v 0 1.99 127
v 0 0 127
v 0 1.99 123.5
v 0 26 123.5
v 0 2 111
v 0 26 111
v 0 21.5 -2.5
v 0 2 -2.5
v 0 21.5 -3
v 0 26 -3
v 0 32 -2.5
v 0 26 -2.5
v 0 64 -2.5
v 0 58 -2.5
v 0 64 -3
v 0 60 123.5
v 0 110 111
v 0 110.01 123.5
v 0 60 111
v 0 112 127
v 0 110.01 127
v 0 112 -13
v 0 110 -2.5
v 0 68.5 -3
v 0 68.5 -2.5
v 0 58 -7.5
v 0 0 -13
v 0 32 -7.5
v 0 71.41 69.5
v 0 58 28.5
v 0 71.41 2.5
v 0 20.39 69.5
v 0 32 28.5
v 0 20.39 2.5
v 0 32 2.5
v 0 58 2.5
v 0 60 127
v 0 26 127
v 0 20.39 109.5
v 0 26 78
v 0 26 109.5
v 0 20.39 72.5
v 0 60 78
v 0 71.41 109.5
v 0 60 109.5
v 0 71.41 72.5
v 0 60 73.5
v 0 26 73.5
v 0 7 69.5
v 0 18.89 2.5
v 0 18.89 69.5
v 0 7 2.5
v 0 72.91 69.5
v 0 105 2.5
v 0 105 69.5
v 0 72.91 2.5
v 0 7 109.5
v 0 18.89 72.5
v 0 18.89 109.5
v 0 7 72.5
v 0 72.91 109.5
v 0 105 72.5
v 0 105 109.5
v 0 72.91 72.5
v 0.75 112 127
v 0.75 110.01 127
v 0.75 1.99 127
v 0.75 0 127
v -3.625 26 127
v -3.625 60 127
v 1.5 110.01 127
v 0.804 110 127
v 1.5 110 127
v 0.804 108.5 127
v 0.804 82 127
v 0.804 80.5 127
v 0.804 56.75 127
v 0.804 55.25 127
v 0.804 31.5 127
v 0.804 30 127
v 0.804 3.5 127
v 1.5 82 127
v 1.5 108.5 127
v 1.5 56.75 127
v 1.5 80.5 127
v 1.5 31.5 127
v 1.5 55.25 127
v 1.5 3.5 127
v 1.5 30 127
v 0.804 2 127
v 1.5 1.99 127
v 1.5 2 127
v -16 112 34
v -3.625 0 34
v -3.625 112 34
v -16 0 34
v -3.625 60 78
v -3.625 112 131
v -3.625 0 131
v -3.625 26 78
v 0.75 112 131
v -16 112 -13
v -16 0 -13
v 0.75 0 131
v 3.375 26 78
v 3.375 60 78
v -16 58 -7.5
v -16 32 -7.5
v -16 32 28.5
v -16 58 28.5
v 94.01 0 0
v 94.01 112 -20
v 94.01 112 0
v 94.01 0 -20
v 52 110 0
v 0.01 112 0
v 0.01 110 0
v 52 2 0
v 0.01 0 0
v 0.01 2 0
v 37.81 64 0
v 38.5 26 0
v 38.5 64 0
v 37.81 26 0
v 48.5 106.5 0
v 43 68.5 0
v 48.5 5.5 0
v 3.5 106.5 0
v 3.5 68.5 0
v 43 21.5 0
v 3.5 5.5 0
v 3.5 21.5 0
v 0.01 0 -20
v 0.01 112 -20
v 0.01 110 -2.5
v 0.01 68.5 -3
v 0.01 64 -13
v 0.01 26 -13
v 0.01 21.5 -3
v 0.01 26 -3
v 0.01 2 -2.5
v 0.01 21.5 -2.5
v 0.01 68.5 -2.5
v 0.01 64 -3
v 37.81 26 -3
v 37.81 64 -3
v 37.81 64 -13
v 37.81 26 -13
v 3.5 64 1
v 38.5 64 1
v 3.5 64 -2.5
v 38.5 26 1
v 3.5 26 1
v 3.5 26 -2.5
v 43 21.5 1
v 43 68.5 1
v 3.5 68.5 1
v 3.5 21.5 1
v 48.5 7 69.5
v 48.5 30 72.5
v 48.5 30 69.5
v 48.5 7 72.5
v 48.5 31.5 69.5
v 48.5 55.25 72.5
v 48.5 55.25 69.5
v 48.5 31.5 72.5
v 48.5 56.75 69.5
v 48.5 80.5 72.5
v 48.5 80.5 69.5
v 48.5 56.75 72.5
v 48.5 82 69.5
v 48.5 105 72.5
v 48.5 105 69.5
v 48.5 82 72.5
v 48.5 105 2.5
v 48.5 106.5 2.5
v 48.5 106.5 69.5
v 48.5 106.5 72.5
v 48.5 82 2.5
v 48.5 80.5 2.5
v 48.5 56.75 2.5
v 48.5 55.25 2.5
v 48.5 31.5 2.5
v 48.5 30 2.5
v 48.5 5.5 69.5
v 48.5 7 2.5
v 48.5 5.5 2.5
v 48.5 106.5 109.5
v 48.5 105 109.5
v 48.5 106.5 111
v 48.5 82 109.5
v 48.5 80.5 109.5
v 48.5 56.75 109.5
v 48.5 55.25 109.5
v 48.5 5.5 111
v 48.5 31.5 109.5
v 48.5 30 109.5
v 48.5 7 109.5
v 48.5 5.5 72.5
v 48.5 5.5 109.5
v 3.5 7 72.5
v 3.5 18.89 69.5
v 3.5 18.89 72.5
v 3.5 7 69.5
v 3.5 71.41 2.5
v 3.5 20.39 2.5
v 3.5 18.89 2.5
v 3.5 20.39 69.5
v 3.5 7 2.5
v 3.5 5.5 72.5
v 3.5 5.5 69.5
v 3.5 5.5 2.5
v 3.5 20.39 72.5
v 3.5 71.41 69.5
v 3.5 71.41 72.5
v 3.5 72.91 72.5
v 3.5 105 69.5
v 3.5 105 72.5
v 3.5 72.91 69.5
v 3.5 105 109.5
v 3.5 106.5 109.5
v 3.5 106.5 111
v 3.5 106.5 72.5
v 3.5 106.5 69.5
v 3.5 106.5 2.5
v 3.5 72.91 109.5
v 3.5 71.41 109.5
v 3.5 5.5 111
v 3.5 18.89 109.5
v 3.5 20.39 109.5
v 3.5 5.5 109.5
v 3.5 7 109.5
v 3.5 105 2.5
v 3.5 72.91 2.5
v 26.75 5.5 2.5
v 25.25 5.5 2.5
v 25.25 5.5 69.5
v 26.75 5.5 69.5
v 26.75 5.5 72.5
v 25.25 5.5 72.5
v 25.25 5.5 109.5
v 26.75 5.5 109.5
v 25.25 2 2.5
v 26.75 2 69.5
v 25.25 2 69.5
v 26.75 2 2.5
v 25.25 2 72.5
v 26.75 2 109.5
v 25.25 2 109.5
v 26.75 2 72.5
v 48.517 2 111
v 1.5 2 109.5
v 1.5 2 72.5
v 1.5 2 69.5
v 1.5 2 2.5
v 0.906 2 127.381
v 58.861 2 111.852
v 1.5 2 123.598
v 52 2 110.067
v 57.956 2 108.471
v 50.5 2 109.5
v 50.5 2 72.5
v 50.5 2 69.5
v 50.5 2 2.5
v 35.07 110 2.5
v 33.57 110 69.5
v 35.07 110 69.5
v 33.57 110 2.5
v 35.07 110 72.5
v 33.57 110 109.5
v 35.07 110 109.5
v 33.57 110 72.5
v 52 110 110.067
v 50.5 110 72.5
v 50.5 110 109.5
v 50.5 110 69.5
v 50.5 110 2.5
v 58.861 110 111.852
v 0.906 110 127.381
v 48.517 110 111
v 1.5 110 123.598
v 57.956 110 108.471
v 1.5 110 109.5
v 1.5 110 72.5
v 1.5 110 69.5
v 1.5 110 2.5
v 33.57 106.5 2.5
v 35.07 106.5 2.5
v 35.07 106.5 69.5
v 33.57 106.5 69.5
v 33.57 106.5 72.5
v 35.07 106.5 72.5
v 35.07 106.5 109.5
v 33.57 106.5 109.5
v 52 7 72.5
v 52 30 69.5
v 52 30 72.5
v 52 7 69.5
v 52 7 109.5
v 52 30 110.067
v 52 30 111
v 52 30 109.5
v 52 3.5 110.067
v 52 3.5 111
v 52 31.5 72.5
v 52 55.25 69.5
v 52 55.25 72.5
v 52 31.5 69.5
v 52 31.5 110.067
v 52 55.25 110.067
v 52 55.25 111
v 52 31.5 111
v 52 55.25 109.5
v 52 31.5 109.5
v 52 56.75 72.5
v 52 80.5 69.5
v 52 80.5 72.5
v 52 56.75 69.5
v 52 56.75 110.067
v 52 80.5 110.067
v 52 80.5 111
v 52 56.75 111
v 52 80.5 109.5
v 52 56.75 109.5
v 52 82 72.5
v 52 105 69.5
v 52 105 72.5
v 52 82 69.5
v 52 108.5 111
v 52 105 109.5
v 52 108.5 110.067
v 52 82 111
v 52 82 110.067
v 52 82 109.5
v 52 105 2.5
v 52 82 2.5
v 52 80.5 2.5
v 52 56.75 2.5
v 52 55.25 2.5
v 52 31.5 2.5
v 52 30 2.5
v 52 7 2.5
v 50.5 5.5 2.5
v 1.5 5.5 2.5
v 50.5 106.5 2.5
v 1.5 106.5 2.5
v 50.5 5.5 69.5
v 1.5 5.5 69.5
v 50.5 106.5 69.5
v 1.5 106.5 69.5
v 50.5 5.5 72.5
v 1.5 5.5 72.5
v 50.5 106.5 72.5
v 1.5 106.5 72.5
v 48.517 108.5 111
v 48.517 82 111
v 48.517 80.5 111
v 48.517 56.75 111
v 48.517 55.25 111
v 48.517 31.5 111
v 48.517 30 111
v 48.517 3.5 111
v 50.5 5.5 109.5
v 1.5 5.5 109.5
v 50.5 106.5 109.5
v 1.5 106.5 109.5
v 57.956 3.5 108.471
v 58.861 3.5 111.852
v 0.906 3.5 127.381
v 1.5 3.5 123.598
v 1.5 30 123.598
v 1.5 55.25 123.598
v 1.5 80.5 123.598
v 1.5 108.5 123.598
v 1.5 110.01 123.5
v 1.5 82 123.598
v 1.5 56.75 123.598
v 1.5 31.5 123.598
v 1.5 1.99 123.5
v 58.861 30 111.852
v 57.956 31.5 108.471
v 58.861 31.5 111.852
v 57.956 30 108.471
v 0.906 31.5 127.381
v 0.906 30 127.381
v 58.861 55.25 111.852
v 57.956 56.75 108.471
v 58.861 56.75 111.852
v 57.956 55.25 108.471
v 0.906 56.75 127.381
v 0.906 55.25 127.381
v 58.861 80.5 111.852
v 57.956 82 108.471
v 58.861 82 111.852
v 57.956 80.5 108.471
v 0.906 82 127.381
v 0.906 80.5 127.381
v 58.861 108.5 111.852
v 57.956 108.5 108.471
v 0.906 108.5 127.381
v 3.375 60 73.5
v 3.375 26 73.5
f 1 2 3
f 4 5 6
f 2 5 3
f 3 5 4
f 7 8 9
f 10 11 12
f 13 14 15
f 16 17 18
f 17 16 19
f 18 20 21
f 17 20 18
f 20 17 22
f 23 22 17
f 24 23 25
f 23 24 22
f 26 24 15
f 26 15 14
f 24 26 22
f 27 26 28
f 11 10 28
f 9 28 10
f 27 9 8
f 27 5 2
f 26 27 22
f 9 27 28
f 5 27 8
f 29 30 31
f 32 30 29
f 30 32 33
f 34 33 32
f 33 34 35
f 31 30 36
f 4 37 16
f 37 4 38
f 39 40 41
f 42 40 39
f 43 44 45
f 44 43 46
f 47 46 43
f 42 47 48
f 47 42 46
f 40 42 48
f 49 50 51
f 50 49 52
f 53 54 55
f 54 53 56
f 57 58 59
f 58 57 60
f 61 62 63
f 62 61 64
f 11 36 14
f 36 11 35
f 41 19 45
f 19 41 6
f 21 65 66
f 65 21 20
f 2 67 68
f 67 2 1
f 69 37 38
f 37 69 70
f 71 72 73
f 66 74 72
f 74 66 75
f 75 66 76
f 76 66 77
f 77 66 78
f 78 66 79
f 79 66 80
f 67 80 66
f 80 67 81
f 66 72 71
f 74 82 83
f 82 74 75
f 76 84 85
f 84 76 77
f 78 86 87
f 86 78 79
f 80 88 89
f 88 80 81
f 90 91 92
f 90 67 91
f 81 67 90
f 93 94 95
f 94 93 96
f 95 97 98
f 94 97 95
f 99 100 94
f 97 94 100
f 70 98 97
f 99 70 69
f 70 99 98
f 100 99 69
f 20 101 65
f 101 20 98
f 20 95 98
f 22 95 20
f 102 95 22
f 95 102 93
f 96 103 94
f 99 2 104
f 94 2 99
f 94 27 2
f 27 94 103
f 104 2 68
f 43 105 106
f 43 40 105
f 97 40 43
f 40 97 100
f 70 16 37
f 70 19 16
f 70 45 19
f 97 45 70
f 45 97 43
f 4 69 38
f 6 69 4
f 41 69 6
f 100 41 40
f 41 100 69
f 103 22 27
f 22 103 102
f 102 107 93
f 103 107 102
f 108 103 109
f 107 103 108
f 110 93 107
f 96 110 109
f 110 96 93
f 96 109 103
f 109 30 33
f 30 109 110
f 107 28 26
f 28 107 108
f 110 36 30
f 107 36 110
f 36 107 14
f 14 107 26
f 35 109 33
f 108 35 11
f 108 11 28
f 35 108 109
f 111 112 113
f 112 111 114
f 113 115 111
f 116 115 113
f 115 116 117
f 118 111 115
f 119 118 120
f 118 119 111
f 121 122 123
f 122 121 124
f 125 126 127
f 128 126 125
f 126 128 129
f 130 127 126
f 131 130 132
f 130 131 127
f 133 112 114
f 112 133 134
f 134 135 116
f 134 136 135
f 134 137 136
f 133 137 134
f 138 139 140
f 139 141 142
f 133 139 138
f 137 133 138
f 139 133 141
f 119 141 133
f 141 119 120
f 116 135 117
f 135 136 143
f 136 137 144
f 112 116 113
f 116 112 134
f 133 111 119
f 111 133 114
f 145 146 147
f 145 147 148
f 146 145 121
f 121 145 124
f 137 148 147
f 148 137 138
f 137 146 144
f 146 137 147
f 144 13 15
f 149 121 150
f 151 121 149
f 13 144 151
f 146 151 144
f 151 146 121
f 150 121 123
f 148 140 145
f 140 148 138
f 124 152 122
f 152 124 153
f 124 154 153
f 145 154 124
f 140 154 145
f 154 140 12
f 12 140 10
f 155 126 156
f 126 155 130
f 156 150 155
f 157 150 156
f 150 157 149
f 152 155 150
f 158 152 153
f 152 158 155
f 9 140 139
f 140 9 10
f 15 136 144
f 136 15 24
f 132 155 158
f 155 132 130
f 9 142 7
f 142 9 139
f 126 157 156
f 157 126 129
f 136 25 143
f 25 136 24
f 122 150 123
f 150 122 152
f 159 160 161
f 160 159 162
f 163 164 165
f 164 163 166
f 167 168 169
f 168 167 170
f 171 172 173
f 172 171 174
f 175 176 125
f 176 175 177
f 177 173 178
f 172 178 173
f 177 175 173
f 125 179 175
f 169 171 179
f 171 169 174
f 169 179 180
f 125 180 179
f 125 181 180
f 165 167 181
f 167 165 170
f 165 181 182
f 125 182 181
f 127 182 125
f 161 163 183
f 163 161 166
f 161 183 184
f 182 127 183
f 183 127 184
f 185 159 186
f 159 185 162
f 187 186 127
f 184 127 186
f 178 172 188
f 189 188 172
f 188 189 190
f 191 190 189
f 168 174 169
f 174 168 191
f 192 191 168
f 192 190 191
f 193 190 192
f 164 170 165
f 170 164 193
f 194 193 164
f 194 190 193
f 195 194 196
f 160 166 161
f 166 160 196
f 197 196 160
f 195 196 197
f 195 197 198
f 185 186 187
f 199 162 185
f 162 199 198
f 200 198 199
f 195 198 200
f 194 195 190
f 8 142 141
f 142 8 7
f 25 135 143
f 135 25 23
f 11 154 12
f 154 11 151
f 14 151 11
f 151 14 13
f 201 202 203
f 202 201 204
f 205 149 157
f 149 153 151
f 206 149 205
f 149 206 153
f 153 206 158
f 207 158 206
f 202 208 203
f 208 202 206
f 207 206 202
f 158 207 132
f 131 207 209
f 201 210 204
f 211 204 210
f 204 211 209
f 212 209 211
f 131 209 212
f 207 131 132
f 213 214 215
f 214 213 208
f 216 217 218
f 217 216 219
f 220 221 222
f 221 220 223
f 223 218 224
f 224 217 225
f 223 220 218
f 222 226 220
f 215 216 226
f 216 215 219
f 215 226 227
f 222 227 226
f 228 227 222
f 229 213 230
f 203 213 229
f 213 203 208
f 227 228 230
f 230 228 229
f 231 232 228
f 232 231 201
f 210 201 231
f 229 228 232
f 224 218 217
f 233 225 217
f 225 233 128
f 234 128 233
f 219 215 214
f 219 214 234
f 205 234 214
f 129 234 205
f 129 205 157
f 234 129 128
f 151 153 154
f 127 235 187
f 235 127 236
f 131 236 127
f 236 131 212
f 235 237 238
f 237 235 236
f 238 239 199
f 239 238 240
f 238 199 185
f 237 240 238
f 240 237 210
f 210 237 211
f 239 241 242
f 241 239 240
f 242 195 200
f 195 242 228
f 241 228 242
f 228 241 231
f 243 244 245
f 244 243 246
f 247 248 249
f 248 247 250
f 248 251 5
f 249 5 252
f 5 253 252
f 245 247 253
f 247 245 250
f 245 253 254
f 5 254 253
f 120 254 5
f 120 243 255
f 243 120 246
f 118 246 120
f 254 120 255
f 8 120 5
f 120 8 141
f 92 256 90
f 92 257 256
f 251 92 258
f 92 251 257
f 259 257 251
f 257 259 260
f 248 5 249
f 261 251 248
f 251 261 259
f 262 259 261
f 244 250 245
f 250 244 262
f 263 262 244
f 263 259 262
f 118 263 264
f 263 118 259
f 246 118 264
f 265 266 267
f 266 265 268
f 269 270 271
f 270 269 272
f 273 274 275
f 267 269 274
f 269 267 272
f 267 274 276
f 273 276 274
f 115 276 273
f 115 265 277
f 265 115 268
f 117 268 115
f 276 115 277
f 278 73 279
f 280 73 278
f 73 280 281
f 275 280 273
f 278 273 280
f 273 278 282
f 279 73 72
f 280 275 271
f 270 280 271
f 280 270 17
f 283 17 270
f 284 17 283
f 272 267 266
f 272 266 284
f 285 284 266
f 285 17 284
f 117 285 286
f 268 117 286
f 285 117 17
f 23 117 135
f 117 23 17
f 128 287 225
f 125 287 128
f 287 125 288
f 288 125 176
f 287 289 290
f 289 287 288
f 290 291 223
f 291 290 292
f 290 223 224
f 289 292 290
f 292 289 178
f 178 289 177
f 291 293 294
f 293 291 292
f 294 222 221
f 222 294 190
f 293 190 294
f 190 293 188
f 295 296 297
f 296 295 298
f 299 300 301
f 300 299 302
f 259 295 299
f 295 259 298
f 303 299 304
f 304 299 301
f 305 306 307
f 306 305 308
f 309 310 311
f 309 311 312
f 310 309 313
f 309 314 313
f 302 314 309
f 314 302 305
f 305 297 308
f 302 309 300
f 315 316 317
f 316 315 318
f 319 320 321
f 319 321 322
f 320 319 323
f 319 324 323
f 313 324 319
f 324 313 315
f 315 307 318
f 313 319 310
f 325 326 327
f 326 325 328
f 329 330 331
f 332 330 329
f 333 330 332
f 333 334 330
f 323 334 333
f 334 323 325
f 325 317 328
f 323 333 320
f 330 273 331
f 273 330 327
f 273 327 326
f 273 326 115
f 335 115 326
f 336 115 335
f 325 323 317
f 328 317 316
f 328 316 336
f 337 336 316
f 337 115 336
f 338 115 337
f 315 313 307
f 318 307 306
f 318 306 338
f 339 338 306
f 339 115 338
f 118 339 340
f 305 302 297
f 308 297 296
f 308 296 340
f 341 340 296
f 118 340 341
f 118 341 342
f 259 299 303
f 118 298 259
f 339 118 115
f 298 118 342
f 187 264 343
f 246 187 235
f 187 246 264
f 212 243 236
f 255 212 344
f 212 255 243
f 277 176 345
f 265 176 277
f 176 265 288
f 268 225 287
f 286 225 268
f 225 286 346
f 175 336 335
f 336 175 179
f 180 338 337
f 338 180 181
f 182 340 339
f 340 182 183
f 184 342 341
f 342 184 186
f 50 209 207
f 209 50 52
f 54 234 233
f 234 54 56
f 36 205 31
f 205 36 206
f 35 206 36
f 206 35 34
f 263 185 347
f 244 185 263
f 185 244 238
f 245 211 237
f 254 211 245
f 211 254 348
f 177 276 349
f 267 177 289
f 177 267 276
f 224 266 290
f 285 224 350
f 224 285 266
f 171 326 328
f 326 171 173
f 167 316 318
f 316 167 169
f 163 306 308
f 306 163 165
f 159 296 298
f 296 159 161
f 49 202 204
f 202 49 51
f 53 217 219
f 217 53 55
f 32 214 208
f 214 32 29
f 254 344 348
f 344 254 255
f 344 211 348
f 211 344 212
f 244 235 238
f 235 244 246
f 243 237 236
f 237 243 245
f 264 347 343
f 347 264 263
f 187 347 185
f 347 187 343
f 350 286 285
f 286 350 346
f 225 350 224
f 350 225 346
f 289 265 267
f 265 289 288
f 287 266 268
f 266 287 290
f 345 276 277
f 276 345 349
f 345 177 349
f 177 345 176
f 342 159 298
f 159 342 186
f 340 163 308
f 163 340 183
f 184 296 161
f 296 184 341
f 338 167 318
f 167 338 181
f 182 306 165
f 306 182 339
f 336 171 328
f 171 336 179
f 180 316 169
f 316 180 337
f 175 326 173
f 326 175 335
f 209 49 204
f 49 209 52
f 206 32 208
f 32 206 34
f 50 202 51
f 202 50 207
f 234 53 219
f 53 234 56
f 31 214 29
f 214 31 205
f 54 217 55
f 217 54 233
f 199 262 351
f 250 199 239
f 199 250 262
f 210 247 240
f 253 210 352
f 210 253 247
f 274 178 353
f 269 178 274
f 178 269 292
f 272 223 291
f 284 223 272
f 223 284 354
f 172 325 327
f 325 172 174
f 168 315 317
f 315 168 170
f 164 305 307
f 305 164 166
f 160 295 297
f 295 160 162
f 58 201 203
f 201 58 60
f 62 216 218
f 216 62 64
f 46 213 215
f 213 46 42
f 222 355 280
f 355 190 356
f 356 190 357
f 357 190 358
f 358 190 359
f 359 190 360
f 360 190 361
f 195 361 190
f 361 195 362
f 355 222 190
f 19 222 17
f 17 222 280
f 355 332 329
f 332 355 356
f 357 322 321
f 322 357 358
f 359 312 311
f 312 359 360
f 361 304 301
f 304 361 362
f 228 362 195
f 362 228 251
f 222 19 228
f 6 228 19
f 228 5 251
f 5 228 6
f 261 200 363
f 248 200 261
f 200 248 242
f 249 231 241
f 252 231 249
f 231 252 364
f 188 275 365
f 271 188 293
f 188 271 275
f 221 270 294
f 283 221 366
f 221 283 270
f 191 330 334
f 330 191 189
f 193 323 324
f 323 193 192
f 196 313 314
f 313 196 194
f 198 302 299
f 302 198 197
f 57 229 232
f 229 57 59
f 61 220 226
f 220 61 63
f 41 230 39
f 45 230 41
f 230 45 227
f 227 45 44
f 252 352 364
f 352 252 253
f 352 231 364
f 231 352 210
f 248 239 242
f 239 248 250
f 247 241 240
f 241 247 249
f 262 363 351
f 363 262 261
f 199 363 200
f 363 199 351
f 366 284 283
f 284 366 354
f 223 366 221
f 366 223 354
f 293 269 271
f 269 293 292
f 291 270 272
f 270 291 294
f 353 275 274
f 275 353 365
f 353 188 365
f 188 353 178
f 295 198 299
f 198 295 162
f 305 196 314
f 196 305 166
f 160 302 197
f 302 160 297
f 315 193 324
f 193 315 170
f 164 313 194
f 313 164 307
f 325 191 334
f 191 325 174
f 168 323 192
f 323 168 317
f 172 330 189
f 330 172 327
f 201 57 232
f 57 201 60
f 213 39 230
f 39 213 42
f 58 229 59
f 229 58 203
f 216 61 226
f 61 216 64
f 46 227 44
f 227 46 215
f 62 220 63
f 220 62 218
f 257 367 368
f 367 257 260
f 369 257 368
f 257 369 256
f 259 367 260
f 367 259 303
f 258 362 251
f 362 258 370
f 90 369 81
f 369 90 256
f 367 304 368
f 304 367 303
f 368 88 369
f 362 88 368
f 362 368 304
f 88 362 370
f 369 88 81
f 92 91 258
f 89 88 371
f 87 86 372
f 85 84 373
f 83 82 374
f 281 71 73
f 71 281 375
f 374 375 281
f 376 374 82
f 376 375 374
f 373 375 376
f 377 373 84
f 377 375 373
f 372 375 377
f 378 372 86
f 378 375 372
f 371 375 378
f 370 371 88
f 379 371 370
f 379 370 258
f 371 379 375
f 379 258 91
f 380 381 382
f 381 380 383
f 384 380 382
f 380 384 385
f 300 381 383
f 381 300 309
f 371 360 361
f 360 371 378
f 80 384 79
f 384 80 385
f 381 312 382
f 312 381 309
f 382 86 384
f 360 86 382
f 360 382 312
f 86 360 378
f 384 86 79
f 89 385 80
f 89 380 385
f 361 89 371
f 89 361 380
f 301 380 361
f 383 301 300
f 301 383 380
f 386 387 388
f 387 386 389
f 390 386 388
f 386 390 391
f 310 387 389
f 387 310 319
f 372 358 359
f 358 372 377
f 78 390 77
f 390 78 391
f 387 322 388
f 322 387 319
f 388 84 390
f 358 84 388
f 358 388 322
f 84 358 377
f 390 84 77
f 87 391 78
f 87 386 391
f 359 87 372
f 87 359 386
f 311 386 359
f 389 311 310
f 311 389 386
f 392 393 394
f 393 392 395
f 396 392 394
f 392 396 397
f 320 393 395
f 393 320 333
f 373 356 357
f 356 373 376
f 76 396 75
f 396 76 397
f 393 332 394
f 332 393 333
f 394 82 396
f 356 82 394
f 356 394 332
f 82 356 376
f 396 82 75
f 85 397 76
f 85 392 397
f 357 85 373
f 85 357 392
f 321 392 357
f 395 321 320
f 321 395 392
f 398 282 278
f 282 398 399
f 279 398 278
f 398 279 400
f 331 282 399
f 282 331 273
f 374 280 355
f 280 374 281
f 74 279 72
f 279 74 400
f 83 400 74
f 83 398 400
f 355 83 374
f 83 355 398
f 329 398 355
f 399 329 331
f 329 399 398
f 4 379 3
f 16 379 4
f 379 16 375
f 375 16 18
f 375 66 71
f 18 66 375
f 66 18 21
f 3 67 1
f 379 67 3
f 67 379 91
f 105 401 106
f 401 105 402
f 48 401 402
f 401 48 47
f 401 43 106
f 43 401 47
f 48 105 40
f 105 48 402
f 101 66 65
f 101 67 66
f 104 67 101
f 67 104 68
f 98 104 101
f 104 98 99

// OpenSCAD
// file: house.scad
/*
 * Partial North Wall
 * 1 = 1 inch
 */
 
// brick wall
brickdepth = 3.625;
difference() {
    color("red")
        translate([-brickdepth, 0, 34])
            cube([brickdepth, 112, 93]);

    translate([-brickdepth - 0.1, 26, 78])
        cube([brickdepth + 0.2, 34, 49.5]);
}

// Window base
color("red")
    translate([-brickdepth, 26, 73.5])
        cube([7, 34, 4.5]);


// trim
color("white")
    translate([-brickdepth, 0, 127])
        cube([brickdepth + 0.75, 112, 4]);

// foundation
concretedepth = 16;
difference() {
    color("lightgrey")
        translate([-concretedepth, 0, -13])
            cube([concretedepth, 112, 47]);

    translate([-concretedepth - 0.1, 32, -7.5])
        cube([concretedepth + 0.2, 26, 36]);
}

// earth
translate([0.01,0,0])
difference() {
    color([0.62, 0.32, 0.18, 0.50])
        translate([0, 0, -20])
            cube([94, 112, 20]);

    translate([-0.2, 26, -13])
        cube([38, 38, 13 + 0.1]);
}

// Window well brick
color("darkgrey") {
    for (y = [21.5, 64])
        translate([0, y, -3])
            cube([43, 4.5, 4]);

    translate([38.5, 21.5, -3])
        cube([4.5, 47, 4]);
}
// file: beam.scad
/*
 * beam.scad
 * 1 = 1 inch
 * Variables: defaultBeamHeight (=1.5), defaultBeamWidth (=3.5), beamColor (="wheat")
 */

defaultBeamHeight = 1.5;
defaultBeamWidth = 3.5;
beamColor = "wheat";

module xBeamY(length, translation=[0, 0, 0], rotation=[0, 0, 0], beamHeight=defaultBeamHeight, beamWidth=defaultBeamWidth) {
    color(beamColor)
        translate(translation)
        rotate(rotation)
        cube([length, beamWidth, beamHeight]);
}

module xBeamZ(length, translation=[0, 0, 0], rotation=[0, 0, 0], beamHeight=defaultBeamHeight, beamWidth=defaultBeamWidth) {
    color(beamColor)
        translate(translation)
        rotate(rotation)
        cube([length, beamHeight, beamWidth]);
}

module yBeamX(length, translation=[0, 0, 0], rotation=[0, 0, 0], beamHeight=defaultBeamHeight, beamWidth=defaultBeamWidth) {
    color(beamColor)
        translate(translation)
        rotate(rotation)
        cube([beamWidth, length, beamHeight]);
}

module yBeamZ(length, translation=[0, 0, 0], rotation=[0, 0, 0], beamHeight=defaultBeamHeight, beamWidth=defaultBeamWidth) {
    color(beamColor)
        translate(translation)
        rotate(rotation)
        cube([beamHeight, length, beamWidth]);
}

module zBeamX(length, translation=[0, 0, 0], rotation=[0, 0, 0], beamHeight=defaultBeamHeight, beamWidth=defaultBeamWidth) {
    color(beamColor)
        translate(translation)
        rotate(rotation)
        cube([beamWidth, beamHeight, length]);
}

module zBeamY(length, translation=[0, 0, 0], rotation=[0, 0, 0], beamHeight=defaultBeamHeight, beamWidth=defaultBeamWidth) {
    color(beamColor)
        translate(translation)
        rotate(rotation)
        cube([beamHeight, beamWidth, length]);
}
// main file
include <beam.scad>
include <house.scad>

// for beam.scad
defaultBeamHeight = 1.5;
defaultBeamWidth = 3.5;

beamHeight = defaultBeamHeight;
beamWidth = defaultBeamWidth;

totalX = 52;
totalY = 108;
totalZ = 127;

foundationDepth = 2.5;
firstTierZ = 70;
secondTierZ = 40;

offsety = 2;

function ratioPlacement(ratio, totalWidth, placementWidth) = max(0, min(totalWidth - placementWidth, totalWidth * ratio - placementWidth / 2));

function evenStuds(studCount, totalWidth) = [ for (x = [0 : 1 / (studCount + 1) : 1]) ratioPlacement(x, totalWidth, beamHeight) ];

longWallWidth = totalY - beamWidth * 2;

farWallStuds = evenStuds(3, longWallWidth);

closeWallStuds = [
    ratioPlacement(0, longWallWidth, beamHeight),
    ratioPlacement(0.14, longWallWidth, beamHeight),
    ratioPlacement(0.66, longWallWidth, beamHeight),
    ratioPlacement(1, longWallWidth, beamHeight)
];

leftWallStuds = evenStuds(1, totalX);

rightWallStuds = [
    ratioPlacement(0, totalX, beamHeight),
    ratioPlacement(0.66, totalX, beamHeight),
    ratioPlacement(1, totalX, beamHeight)
];

rafters = [
    ratioPlacement(0, totalY, beamHeight),
    farWallStuds[1] + beamWidth,
    farWallStuds[2] + beamWidth,
    farWallStuds[3] + beamWidth,
    ratioPlacement(1, totalY, beamHeight)
];
rafterLength = 60;

module tier(height) {

        // Floor and top plates
        for (z = [0, height - beamHeight]) {
            // Side walls
            for (y = [0, totalY - beamWidth])
                xBeamY(totalX, [0, y, z]);

            // Long walls
            for (x = [0, totalX - beamWidth])
                yBeamX(totalY - 2 * beamWidth, [x, beamWidth, z]);
        }

        studLength = height - 2 * beamHeight;

        for (x = leftWallStuds)
            zBeamY(studLength, [x, 0, beamHeight]);

        for (x = rightWallStuds)
            zBeamY(studLength, [x, totalY - beamWidth, beamHeight]);

        for (y = farWallStuds)
            zBeamX(studLength, [totalX - beamWidth, y + beamWidth, beamHeight]);

        for (y = closeWallStuds)
            zBeamX(studLength, [0, y + beamWidth, beamHeight]);

}

module roofBeam() {
    yBeamZ(totalY + 0.02, [0, -0.01, totalZ - beamWidth]);
}

translate ([0, offsety, 0]) {

    // Foundation
    translate([0, 0, -foundationDepth]) {
        // Side walls
        for (y = [0, totalY - beamWidth])
            xBeamZ(totalX - 2 * beamWidth, [beamWidth, y, 0], beamHeight=3.5, beamWidth=3.5);

        // Long walls
        for (x = [0, totalX - beamWidth])
            yBeamZ(totalY, [x, 0, 0], beamHeight=3.5, beamWidth=3.5);
    }

    // First tier
    translate ([0, 0, beamWidth - foundationDepth])
        tier(firstTierZ);

    // Second tier
    translate([0, 0, firstTierZ + beamWidth - foundationDepth])
        tier(secondTierZ);

    // Roof
    roofBeam();

    for (y = rafters)
        difference() {
            xBeamZ(rafterLength, [0, y, totalZ - beamWidth + 0.5], [0, 15, 0]);
            roofBeam();
            yBeamX(totalY + 0.02, [totalX - beamWidth, -0.01, totalZ - beamHeight]);
        }
}
